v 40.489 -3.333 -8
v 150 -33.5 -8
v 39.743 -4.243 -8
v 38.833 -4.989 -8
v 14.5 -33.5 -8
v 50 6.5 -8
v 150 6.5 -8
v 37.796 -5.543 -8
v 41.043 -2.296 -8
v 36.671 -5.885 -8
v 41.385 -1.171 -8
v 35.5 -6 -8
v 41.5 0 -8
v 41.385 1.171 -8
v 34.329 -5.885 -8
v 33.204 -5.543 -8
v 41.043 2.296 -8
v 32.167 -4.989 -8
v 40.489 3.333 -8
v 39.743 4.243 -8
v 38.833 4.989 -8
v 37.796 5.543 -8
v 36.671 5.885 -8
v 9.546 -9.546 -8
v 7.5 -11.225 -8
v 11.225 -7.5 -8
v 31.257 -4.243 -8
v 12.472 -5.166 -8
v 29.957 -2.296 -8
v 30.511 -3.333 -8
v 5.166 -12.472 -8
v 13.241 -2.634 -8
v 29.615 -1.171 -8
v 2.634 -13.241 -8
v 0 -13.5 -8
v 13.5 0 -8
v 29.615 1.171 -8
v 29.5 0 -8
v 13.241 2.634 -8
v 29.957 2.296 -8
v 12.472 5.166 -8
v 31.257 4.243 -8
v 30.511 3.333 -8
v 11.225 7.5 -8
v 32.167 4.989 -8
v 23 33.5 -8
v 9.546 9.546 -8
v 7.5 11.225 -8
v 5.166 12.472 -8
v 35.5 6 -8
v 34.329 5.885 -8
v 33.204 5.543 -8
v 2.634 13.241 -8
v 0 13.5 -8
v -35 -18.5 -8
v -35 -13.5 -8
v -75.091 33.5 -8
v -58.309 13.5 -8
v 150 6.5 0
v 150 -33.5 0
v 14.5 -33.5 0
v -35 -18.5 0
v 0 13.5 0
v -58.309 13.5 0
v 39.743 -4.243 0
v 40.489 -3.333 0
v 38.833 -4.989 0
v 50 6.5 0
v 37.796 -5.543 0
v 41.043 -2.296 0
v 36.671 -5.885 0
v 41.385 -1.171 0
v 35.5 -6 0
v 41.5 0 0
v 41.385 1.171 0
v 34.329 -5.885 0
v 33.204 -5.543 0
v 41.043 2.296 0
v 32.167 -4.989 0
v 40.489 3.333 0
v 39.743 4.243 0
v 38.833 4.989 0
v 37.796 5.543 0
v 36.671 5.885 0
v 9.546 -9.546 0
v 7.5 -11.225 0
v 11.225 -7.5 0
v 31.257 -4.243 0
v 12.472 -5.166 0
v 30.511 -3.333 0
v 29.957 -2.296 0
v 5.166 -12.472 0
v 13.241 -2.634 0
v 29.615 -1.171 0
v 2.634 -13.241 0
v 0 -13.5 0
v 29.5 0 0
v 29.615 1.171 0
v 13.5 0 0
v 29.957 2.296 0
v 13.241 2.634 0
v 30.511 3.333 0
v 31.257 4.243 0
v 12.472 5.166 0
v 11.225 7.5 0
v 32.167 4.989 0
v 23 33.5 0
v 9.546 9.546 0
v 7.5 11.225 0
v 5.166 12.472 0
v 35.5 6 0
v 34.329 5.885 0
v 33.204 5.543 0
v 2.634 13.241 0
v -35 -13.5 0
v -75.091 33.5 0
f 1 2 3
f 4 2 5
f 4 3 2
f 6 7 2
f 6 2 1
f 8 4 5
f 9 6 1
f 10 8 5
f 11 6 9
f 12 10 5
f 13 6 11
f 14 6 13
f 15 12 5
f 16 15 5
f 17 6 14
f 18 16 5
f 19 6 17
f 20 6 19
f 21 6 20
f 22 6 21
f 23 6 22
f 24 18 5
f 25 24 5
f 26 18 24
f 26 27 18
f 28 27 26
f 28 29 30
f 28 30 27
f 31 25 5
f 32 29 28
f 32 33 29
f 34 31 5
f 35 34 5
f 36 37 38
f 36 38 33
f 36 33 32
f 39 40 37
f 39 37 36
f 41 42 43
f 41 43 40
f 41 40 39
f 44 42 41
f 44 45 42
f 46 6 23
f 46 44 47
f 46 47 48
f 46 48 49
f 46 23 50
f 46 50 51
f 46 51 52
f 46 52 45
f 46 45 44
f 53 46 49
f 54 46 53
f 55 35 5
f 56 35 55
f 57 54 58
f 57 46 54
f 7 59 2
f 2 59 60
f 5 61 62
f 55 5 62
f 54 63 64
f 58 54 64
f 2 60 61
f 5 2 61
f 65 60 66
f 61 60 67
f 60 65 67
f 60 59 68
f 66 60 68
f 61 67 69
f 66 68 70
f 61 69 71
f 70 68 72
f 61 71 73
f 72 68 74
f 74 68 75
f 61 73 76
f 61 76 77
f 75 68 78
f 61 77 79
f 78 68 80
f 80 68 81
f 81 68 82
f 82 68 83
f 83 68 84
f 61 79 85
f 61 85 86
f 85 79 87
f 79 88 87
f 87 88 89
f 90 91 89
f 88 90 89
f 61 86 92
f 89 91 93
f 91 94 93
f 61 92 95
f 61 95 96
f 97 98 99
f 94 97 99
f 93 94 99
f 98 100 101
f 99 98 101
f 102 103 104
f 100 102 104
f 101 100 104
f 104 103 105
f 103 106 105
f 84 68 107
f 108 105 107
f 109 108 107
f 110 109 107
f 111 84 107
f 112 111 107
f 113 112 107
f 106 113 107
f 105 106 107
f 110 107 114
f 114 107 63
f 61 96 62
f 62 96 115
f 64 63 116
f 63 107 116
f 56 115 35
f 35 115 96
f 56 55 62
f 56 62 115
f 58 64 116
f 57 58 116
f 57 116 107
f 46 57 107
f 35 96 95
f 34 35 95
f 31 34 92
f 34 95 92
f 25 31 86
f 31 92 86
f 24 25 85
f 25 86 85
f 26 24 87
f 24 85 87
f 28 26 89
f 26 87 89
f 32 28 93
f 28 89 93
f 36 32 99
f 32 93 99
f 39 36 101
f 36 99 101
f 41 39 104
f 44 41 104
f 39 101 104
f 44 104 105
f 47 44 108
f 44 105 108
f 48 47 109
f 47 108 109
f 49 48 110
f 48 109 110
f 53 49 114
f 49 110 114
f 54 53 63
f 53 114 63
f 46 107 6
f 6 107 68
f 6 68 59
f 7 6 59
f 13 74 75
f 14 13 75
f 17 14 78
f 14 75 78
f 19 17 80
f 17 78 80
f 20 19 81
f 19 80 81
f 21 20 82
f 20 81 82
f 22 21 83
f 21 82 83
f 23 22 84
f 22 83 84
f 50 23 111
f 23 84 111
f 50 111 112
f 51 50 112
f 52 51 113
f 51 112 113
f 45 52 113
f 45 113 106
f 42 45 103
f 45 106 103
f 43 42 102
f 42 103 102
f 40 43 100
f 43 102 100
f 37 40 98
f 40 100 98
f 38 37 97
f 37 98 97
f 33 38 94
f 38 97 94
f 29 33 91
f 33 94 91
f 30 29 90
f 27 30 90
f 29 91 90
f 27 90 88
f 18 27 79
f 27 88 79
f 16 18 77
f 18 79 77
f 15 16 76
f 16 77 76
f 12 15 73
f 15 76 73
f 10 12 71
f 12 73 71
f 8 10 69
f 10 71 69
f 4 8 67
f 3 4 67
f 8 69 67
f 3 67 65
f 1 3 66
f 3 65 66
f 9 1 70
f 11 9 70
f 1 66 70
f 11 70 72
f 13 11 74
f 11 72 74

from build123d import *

# Parameters (mm, degrees)
SKETCH_1_R             = 6
SM_BASE_FLANGE_1_DEPTH = 8


# Sheet-metal steps are written as plain solids
with BuildPart() as part:
    # Sketch 1 → Базовая кромка1 (new body)
    with BuildSketch(Plane.XY):
        with BuildLine():
            Line((-35, -13.5), (0, -13.5))
            ThreePointArc((0, -13.5), (13.5, 0), (0, 13.5))
            Line((0, 13.5), (-58.308631084, 13.5))
            Line((-58.308631084, 13.5), (-75.090623708, 33.5))
            Line((-75.090623708, 33.5), (23, 33.5))
            Line((23, 33.5), (50, 6.5))
            Line((50, 6.5), (150, 6.5))
            Line((150, 6.5), (150, -33.5))
            Line((150, -33.5), (14.5, -33.5))
            Line((14.5, -33.5), (-35, -18.5))
            Line((-35, -18.5), (-35, -13.5))
        make_face()
        with Locations((35.5, 0)):
            Circle(SKETCH_1_R, mode=Mode.SUBTRACT)
    extrude(amount=-SM_BASE_FLANGE_1_DEPTH)


solid = part.part
